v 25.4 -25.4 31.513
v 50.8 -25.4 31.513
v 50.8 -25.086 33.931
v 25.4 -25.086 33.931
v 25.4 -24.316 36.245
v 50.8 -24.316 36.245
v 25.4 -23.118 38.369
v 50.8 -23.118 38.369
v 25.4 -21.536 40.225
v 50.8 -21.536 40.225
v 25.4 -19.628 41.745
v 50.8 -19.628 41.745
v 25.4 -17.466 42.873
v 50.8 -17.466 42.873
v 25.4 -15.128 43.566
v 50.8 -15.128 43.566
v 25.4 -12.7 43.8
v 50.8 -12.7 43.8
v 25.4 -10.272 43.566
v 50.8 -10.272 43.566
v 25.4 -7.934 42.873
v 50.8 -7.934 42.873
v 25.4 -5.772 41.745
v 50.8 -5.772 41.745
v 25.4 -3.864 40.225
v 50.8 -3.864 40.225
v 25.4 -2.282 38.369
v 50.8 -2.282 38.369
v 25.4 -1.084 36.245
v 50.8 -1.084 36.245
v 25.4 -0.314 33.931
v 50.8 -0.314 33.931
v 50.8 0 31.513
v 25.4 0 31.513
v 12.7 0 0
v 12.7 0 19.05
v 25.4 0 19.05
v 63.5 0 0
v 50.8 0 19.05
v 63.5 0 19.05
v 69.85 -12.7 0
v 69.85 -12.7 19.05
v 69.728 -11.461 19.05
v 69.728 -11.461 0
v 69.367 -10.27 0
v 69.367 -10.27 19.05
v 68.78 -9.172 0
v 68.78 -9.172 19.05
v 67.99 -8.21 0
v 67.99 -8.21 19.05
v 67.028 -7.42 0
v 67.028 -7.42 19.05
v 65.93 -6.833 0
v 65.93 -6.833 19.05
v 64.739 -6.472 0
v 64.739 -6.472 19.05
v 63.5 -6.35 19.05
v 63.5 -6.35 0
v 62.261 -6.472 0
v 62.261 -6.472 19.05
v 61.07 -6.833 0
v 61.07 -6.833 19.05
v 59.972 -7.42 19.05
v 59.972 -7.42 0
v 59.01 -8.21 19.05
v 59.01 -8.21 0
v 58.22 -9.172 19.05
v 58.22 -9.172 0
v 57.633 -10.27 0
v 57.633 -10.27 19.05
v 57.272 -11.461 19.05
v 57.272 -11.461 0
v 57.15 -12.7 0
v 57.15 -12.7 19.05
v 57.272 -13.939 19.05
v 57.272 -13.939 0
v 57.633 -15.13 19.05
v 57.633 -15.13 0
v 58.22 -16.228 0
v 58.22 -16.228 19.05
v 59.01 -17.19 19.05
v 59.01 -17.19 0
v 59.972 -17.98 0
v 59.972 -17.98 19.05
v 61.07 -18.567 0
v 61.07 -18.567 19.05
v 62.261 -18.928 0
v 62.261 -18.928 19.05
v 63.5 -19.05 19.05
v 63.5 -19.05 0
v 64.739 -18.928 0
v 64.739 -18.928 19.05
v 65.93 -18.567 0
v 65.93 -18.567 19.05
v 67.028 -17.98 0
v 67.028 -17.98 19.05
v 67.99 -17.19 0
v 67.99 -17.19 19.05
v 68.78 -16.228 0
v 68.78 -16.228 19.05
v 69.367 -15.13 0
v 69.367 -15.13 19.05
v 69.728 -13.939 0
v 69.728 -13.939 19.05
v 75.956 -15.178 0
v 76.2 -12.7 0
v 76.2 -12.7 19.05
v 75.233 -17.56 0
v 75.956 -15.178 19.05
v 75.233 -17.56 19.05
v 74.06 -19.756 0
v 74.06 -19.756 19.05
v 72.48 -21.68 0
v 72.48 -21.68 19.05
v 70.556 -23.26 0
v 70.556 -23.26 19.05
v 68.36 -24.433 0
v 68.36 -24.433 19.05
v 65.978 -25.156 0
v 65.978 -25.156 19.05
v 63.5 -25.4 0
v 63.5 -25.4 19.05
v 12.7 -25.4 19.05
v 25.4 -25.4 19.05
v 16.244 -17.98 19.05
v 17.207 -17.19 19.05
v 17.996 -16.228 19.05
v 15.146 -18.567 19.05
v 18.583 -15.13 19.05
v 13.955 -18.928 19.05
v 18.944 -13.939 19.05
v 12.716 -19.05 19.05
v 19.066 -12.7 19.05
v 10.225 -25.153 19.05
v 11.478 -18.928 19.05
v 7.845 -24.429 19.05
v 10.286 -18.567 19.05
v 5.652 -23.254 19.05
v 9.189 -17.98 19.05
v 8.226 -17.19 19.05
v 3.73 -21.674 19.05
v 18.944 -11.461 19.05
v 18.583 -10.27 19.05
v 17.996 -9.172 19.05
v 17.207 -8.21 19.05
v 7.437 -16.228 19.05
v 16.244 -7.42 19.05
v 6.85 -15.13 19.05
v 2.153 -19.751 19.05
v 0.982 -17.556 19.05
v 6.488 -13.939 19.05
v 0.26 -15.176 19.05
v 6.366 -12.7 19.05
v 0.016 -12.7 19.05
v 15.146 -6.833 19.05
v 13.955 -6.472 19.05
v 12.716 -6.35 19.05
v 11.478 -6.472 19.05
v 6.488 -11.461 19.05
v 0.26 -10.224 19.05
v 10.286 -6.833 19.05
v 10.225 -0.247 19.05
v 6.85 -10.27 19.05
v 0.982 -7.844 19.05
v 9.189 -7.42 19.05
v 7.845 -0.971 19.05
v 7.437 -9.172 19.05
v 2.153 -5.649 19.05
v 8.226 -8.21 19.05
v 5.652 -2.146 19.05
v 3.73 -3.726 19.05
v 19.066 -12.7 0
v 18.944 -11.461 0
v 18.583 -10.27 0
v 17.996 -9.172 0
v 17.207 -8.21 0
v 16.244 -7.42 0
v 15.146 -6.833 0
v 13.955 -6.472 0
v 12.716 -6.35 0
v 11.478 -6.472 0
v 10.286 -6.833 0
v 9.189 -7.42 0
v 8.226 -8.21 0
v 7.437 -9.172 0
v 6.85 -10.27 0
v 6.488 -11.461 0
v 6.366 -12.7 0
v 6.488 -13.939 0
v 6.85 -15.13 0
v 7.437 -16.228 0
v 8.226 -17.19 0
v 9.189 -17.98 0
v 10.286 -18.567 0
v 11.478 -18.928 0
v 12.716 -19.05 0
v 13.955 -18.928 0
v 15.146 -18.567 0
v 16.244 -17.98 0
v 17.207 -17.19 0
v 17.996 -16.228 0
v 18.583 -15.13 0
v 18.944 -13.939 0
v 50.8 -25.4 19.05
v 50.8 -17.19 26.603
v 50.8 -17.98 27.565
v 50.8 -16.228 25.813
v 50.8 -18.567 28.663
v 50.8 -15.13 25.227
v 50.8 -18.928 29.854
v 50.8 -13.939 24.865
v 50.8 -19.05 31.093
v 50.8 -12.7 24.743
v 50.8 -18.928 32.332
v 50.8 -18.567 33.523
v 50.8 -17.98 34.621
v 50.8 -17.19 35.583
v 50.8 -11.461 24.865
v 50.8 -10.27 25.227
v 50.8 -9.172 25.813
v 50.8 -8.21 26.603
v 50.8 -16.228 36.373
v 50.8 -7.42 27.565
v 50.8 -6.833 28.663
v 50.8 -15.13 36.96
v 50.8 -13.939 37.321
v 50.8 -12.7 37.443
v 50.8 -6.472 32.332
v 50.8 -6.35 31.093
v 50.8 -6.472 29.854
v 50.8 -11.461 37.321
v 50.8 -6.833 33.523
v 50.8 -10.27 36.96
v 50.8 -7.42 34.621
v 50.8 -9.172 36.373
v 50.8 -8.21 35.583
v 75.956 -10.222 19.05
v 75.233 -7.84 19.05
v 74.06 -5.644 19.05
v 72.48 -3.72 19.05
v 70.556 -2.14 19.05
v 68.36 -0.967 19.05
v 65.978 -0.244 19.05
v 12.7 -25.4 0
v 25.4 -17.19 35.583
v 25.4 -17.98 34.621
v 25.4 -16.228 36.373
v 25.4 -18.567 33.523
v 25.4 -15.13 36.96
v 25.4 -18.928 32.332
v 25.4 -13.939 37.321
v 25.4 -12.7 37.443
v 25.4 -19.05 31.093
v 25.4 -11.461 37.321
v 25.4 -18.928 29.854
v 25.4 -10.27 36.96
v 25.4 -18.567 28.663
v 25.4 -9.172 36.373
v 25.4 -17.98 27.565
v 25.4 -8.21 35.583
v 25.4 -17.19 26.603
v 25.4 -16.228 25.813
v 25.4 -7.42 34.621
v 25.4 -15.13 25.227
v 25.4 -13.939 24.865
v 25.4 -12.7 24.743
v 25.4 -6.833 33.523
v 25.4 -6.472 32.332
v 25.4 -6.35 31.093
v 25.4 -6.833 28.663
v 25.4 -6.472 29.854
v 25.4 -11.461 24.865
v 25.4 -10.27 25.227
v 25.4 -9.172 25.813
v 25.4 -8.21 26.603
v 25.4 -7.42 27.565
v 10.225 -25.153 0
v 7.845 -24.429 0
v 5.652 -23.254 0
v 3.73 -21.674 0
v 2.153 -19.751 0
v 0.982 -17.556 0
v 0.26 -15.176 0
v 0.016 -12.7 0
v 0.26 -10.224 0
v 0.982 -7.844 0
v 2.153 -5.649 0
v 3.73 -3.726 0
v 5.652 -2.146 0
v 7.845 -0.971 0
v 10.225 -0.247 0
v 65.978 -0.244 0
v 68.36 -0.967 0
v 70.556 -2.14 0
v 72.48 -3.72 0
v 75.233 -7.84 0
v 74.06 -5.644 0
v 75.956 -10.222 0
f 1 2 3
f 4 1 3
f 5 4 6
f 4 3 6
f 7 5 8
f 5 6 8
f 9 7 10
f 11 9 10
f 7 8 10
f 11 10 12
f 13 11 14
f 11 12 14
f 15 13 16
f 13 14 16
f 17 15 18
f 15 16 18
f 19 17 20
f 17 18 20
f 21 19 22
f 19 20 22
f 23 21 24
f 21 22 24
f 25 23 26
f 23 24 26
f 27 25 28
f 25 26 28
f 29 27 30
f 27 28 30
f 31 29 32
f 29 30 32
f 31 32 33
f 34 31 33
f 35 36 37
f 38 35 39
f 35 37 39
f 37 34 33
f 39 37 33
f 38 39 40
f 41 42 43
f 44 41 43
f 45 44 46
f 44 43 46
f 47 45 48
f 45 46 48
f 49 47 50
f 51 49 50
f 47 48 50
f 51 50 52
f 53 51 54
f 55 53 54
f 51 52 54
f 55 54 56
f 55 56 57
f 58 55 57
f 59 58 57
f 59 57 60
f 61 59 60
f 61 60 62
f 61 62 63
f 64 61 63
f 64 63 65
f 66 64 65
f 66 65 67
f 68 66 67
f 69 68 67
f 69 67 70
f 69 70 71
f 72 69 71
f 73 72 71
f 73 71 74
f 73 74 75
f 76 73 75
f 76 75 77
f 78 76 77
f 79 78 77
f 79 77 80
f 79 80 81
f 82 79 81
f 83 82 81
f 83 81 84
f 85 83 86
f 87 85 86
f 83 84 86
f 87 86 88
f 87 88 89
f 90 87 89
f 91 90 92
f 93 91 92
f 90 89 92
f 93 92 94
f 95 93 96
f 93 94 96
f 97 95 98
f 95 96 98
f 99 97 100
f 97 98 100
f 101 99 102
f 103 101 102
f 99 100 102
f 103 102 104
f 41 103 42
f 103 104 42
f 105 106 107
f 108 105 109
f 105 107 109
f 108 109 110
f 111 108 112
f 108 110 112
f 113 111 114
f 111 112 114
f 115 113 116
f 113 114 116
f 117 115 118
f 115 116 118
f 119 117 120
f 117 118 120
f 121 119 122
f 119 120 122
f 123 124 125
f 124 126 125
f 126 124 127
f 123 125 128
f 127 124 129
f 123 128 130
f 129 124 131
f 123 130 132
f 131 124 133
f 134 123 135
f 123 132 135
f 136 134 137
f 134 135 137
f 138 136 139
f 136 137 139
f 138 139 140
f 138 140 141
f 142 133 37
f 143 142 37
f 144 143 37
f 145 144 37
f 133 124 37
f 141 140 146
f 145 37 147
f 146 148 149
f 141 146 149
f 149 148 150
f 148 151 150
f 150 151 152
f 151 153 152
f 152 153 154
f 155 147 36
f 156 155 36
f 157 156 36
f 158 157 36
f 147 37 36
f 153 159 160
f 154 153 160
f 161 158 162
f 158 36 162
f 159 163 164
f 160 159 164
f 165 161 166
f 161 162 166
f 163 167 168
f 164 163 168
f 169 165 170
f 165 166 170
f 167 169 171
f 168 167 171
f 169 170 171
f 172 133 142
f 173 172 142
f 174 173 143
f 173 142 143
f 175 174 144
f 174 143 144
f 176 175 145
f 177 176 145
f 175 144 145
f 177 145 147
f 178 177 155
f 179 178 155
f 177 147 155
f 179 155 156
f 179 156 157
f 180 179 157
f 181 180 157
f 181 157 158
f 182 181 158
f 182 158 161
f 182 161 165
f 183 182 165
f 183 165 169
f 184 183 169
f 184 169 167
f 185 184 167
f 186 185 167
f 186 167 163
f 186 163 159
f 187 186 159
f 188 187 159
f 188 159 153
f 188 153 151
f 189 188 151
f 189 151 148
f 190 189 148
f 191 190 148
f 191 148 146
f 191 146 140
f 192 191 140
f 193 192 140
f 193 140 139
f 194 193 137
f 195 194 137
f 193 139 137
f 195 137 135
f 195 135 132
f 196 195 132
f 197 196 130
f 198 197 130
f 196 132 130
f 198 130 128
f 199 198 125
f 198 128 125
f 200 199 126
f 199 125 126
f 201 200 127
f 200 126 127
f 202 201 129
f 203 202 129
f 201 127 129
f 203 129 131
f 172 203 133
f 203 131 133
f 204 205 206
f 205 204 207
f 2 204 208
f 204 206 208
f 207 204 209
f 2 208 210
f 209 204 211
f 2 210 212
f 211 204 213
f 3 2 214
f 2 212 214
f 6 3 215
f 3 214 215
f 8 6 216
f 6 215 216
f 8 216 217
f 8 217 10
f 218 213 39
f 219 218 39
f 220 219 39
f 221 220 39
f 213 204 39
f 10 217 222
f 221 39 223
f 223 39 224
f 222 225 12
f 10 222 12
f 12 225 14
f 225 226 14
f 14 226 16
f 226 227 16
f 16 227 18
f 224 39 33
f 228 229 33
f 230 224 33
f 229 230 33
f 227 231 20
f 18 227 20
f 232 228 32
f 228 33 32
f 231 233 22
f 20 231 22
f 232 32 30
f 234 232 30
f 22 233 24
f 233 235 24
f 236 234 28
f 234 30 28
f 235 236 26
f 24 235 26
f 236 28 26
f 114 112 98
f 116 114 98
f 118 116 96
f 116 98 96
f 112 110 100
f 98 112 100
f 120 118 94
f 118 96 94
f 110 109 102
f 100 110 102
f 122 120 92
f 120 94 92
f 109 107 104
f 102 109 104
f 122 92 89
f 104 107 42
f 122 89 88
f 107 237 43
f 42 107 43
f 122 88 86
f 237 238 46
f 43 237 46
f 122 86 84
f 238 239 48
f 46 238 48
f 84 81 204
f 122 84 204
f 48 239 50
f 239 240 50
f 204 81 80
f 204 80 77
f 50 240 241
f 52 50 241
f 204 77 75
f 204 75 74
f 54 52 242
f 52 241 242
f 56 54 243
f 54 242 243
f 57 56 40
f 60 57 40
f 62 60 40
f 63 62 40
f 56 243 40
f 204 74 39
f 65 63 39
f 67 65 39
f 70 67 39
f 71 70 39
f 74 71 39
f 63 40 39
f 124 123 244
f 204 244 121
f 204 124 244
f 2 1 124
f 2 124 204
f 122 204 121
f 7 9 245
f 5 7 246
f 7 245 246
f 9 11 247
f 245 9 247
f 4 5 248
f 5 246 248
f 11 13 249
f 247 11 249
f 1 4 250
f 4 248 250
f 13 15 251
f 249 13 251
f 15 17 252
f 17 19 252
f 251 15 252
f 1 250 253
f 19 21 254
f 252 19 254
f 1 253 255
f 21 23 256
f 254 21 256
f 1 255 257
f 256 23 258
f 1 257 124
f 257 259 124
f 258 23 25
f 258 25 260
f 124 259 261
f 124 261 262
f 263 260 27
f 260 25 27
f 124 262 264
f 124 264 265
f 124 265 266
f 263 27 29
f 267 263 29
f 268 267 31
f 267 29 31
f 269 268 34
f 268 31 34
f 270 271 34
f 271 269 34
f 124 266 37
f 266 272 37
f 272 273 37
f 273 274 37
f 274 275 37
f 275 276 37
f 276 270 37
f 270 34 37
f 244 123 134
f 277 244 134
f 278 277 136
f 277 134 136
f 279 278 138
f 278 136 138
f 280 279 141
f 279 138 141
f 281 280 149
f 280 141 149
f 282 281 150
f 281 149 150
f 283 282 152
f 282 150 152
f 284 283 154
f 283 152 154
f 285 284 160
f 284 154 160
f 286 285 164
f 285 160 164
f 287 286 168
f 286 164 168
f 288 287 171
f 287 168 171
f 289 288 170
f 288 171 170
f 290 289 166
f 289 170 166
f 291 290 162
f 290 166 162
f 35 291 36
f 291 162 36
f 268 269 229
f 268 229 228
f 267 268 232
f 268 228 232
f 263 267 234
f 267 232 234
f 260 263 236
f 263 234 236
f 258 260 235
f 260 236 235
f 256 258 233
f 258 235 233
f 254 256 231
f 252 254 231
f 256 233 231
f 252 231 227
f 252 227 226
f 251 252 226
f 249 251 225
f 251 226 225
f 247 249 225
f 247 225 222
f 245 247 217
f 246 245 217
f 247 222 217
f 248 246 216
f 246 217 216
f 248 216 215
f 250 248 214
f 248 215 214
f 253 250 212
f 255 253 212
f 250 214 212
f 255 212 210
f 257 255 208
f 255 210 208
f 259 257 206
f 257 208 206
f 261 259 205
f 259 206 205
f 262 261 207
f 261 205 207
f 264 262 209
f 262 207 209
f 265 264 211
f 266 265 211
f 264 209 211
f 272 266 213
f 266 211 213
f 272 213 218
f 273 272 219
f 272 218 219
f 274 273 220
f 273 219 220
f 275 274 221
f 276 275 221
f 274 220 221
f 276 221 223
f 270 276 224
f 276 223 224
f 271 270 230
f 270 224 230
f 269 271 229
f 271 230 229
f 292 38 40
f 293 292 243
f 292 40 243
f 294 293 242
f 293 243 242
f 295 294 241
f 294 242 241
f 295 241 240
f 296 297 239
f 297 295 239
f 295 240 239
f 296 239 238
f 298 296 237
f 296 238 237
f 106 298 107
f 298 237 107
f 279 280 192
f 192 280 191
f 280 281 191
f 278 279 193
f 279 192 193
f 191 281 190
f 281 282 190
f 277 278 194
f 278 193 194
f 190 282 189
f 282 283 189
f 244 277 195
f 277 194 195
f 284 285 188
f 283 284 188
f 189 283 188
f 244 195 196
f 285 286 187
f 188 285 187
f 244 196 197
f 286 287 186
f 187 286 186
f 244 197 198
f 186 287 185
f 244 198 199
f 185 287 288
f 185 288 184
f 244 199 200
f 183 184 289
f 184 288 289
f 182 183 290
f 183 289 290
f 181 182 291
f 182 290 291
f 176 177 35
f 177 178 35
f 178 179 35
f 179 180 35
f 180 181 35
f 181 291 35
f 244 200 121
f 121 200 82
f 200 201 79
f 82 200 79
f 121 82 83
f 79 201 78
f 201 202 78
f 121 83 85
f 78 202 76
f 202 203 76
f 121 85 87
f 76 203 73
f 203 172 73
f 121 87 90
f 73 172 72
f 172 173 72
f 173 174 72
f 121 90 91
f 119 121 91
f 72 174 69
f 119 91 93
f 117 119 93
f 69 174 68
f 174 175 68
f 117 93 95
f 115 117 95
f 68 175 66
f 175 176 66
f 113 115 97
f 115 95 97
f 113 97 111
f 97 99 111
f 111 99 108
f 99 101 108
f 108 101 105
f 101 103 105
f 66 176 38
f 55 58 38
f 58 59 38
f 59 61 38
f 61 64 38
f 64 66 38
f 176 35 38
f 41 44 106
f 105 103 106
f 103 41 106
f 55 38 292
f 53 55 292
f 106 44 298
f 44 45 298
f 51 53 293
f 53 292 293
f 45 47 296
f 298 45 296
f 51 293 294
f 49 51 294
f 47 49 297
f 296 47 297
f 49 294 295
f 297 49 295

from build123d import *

# Parameters (mm, degrees)
F1_DEPTH = 25.4
F2_R     = 6.35
F3_DEPTH = 25.4
F4_R     = 6.35
F5_DEPTH = 25.4
F7_DEPTH = 25.4


with BuildPart() as f1:
    # F0 (on Front) → F1 (new body)
    with BuildSketch(Plane.XZ):
        Polygon((0, 19.05), (0, 0), (76.2, 0), (76.2, 19.05), (50.8, 19.05), (50.8, 43.9752354272), (25.4, 43.9752354272), (25.4, 19.05), align=None)
    extrude(amount=F1_DEPTH)

    # F2 (on face) → F3 (cut)
    with BuildSketch(Plane.YZ.offset(50.8)):
        with Locations((-12.7, 31.0931869331)):
            Circle(F2_R)
        with BuildLine():
            ThreePointArc((-25.4, 31.5126177136), (-12.7, 43.8001111156), (0, 31.5126177136))
            Line((0, 31.5126177136), (0, 43.9752354272))
            Line((0, 43.9752354272), (-25.4, 43.9752354272))
            Line((-25.4, 43.9752354272), (-25.4, 31.5126177136))
        make_face()
    extrude(amount=-F3_DEPTH, mode=Mode.SUBTRACT)

    # F4 (on face) → F5 (cut)
    with BuildSketch(Plane.XY.offset(19.05)):
        with Locations((12.7164462461, -12.7)):
            Circle(F4_R)
        with BuildLine():
            ThreePointArc((12.7, -25.4), (0.0164355973, -12.7), (12.7, 0))
            Line((12.7, 0), (0, 0))
            Line((0, 0), (0, -25.4))
            Line((0, -25.4), (12.7, -25.4))
        make_face()
        with Locations((63.5, -12.7)):
            Circle(F4_R)
    extrude(amount=-F5_DEPTH, mode=Mode.SUBTRACT)

    # F6 (on face) → F7 (cut)
    with BuildSketch(Plane.XY.offset(19.05)):
        with BuildLine():
            ThreePointArc((63.5, 0), (72.4802561211, -3.7197438789), (76.2, -12.7))
            Line((76.2, -12.7), (76.2, 0))
            Line((76.2, 0), (63.5, 0))
        make_face()
        with BuildLine():
            ThreePointArc((76.2, -12.7), (72.4802561211, -21.6802561211), (63.5, -25.4))
            Line((63.5, -25.4), (76.2, -25.4))
            Line((76.2, -25.4), (76.2, -12.7))
        make_face()
    extrude(amount=-F7_DEPTH, mode=Mode.SUBTRACT)


solid = f1.part
